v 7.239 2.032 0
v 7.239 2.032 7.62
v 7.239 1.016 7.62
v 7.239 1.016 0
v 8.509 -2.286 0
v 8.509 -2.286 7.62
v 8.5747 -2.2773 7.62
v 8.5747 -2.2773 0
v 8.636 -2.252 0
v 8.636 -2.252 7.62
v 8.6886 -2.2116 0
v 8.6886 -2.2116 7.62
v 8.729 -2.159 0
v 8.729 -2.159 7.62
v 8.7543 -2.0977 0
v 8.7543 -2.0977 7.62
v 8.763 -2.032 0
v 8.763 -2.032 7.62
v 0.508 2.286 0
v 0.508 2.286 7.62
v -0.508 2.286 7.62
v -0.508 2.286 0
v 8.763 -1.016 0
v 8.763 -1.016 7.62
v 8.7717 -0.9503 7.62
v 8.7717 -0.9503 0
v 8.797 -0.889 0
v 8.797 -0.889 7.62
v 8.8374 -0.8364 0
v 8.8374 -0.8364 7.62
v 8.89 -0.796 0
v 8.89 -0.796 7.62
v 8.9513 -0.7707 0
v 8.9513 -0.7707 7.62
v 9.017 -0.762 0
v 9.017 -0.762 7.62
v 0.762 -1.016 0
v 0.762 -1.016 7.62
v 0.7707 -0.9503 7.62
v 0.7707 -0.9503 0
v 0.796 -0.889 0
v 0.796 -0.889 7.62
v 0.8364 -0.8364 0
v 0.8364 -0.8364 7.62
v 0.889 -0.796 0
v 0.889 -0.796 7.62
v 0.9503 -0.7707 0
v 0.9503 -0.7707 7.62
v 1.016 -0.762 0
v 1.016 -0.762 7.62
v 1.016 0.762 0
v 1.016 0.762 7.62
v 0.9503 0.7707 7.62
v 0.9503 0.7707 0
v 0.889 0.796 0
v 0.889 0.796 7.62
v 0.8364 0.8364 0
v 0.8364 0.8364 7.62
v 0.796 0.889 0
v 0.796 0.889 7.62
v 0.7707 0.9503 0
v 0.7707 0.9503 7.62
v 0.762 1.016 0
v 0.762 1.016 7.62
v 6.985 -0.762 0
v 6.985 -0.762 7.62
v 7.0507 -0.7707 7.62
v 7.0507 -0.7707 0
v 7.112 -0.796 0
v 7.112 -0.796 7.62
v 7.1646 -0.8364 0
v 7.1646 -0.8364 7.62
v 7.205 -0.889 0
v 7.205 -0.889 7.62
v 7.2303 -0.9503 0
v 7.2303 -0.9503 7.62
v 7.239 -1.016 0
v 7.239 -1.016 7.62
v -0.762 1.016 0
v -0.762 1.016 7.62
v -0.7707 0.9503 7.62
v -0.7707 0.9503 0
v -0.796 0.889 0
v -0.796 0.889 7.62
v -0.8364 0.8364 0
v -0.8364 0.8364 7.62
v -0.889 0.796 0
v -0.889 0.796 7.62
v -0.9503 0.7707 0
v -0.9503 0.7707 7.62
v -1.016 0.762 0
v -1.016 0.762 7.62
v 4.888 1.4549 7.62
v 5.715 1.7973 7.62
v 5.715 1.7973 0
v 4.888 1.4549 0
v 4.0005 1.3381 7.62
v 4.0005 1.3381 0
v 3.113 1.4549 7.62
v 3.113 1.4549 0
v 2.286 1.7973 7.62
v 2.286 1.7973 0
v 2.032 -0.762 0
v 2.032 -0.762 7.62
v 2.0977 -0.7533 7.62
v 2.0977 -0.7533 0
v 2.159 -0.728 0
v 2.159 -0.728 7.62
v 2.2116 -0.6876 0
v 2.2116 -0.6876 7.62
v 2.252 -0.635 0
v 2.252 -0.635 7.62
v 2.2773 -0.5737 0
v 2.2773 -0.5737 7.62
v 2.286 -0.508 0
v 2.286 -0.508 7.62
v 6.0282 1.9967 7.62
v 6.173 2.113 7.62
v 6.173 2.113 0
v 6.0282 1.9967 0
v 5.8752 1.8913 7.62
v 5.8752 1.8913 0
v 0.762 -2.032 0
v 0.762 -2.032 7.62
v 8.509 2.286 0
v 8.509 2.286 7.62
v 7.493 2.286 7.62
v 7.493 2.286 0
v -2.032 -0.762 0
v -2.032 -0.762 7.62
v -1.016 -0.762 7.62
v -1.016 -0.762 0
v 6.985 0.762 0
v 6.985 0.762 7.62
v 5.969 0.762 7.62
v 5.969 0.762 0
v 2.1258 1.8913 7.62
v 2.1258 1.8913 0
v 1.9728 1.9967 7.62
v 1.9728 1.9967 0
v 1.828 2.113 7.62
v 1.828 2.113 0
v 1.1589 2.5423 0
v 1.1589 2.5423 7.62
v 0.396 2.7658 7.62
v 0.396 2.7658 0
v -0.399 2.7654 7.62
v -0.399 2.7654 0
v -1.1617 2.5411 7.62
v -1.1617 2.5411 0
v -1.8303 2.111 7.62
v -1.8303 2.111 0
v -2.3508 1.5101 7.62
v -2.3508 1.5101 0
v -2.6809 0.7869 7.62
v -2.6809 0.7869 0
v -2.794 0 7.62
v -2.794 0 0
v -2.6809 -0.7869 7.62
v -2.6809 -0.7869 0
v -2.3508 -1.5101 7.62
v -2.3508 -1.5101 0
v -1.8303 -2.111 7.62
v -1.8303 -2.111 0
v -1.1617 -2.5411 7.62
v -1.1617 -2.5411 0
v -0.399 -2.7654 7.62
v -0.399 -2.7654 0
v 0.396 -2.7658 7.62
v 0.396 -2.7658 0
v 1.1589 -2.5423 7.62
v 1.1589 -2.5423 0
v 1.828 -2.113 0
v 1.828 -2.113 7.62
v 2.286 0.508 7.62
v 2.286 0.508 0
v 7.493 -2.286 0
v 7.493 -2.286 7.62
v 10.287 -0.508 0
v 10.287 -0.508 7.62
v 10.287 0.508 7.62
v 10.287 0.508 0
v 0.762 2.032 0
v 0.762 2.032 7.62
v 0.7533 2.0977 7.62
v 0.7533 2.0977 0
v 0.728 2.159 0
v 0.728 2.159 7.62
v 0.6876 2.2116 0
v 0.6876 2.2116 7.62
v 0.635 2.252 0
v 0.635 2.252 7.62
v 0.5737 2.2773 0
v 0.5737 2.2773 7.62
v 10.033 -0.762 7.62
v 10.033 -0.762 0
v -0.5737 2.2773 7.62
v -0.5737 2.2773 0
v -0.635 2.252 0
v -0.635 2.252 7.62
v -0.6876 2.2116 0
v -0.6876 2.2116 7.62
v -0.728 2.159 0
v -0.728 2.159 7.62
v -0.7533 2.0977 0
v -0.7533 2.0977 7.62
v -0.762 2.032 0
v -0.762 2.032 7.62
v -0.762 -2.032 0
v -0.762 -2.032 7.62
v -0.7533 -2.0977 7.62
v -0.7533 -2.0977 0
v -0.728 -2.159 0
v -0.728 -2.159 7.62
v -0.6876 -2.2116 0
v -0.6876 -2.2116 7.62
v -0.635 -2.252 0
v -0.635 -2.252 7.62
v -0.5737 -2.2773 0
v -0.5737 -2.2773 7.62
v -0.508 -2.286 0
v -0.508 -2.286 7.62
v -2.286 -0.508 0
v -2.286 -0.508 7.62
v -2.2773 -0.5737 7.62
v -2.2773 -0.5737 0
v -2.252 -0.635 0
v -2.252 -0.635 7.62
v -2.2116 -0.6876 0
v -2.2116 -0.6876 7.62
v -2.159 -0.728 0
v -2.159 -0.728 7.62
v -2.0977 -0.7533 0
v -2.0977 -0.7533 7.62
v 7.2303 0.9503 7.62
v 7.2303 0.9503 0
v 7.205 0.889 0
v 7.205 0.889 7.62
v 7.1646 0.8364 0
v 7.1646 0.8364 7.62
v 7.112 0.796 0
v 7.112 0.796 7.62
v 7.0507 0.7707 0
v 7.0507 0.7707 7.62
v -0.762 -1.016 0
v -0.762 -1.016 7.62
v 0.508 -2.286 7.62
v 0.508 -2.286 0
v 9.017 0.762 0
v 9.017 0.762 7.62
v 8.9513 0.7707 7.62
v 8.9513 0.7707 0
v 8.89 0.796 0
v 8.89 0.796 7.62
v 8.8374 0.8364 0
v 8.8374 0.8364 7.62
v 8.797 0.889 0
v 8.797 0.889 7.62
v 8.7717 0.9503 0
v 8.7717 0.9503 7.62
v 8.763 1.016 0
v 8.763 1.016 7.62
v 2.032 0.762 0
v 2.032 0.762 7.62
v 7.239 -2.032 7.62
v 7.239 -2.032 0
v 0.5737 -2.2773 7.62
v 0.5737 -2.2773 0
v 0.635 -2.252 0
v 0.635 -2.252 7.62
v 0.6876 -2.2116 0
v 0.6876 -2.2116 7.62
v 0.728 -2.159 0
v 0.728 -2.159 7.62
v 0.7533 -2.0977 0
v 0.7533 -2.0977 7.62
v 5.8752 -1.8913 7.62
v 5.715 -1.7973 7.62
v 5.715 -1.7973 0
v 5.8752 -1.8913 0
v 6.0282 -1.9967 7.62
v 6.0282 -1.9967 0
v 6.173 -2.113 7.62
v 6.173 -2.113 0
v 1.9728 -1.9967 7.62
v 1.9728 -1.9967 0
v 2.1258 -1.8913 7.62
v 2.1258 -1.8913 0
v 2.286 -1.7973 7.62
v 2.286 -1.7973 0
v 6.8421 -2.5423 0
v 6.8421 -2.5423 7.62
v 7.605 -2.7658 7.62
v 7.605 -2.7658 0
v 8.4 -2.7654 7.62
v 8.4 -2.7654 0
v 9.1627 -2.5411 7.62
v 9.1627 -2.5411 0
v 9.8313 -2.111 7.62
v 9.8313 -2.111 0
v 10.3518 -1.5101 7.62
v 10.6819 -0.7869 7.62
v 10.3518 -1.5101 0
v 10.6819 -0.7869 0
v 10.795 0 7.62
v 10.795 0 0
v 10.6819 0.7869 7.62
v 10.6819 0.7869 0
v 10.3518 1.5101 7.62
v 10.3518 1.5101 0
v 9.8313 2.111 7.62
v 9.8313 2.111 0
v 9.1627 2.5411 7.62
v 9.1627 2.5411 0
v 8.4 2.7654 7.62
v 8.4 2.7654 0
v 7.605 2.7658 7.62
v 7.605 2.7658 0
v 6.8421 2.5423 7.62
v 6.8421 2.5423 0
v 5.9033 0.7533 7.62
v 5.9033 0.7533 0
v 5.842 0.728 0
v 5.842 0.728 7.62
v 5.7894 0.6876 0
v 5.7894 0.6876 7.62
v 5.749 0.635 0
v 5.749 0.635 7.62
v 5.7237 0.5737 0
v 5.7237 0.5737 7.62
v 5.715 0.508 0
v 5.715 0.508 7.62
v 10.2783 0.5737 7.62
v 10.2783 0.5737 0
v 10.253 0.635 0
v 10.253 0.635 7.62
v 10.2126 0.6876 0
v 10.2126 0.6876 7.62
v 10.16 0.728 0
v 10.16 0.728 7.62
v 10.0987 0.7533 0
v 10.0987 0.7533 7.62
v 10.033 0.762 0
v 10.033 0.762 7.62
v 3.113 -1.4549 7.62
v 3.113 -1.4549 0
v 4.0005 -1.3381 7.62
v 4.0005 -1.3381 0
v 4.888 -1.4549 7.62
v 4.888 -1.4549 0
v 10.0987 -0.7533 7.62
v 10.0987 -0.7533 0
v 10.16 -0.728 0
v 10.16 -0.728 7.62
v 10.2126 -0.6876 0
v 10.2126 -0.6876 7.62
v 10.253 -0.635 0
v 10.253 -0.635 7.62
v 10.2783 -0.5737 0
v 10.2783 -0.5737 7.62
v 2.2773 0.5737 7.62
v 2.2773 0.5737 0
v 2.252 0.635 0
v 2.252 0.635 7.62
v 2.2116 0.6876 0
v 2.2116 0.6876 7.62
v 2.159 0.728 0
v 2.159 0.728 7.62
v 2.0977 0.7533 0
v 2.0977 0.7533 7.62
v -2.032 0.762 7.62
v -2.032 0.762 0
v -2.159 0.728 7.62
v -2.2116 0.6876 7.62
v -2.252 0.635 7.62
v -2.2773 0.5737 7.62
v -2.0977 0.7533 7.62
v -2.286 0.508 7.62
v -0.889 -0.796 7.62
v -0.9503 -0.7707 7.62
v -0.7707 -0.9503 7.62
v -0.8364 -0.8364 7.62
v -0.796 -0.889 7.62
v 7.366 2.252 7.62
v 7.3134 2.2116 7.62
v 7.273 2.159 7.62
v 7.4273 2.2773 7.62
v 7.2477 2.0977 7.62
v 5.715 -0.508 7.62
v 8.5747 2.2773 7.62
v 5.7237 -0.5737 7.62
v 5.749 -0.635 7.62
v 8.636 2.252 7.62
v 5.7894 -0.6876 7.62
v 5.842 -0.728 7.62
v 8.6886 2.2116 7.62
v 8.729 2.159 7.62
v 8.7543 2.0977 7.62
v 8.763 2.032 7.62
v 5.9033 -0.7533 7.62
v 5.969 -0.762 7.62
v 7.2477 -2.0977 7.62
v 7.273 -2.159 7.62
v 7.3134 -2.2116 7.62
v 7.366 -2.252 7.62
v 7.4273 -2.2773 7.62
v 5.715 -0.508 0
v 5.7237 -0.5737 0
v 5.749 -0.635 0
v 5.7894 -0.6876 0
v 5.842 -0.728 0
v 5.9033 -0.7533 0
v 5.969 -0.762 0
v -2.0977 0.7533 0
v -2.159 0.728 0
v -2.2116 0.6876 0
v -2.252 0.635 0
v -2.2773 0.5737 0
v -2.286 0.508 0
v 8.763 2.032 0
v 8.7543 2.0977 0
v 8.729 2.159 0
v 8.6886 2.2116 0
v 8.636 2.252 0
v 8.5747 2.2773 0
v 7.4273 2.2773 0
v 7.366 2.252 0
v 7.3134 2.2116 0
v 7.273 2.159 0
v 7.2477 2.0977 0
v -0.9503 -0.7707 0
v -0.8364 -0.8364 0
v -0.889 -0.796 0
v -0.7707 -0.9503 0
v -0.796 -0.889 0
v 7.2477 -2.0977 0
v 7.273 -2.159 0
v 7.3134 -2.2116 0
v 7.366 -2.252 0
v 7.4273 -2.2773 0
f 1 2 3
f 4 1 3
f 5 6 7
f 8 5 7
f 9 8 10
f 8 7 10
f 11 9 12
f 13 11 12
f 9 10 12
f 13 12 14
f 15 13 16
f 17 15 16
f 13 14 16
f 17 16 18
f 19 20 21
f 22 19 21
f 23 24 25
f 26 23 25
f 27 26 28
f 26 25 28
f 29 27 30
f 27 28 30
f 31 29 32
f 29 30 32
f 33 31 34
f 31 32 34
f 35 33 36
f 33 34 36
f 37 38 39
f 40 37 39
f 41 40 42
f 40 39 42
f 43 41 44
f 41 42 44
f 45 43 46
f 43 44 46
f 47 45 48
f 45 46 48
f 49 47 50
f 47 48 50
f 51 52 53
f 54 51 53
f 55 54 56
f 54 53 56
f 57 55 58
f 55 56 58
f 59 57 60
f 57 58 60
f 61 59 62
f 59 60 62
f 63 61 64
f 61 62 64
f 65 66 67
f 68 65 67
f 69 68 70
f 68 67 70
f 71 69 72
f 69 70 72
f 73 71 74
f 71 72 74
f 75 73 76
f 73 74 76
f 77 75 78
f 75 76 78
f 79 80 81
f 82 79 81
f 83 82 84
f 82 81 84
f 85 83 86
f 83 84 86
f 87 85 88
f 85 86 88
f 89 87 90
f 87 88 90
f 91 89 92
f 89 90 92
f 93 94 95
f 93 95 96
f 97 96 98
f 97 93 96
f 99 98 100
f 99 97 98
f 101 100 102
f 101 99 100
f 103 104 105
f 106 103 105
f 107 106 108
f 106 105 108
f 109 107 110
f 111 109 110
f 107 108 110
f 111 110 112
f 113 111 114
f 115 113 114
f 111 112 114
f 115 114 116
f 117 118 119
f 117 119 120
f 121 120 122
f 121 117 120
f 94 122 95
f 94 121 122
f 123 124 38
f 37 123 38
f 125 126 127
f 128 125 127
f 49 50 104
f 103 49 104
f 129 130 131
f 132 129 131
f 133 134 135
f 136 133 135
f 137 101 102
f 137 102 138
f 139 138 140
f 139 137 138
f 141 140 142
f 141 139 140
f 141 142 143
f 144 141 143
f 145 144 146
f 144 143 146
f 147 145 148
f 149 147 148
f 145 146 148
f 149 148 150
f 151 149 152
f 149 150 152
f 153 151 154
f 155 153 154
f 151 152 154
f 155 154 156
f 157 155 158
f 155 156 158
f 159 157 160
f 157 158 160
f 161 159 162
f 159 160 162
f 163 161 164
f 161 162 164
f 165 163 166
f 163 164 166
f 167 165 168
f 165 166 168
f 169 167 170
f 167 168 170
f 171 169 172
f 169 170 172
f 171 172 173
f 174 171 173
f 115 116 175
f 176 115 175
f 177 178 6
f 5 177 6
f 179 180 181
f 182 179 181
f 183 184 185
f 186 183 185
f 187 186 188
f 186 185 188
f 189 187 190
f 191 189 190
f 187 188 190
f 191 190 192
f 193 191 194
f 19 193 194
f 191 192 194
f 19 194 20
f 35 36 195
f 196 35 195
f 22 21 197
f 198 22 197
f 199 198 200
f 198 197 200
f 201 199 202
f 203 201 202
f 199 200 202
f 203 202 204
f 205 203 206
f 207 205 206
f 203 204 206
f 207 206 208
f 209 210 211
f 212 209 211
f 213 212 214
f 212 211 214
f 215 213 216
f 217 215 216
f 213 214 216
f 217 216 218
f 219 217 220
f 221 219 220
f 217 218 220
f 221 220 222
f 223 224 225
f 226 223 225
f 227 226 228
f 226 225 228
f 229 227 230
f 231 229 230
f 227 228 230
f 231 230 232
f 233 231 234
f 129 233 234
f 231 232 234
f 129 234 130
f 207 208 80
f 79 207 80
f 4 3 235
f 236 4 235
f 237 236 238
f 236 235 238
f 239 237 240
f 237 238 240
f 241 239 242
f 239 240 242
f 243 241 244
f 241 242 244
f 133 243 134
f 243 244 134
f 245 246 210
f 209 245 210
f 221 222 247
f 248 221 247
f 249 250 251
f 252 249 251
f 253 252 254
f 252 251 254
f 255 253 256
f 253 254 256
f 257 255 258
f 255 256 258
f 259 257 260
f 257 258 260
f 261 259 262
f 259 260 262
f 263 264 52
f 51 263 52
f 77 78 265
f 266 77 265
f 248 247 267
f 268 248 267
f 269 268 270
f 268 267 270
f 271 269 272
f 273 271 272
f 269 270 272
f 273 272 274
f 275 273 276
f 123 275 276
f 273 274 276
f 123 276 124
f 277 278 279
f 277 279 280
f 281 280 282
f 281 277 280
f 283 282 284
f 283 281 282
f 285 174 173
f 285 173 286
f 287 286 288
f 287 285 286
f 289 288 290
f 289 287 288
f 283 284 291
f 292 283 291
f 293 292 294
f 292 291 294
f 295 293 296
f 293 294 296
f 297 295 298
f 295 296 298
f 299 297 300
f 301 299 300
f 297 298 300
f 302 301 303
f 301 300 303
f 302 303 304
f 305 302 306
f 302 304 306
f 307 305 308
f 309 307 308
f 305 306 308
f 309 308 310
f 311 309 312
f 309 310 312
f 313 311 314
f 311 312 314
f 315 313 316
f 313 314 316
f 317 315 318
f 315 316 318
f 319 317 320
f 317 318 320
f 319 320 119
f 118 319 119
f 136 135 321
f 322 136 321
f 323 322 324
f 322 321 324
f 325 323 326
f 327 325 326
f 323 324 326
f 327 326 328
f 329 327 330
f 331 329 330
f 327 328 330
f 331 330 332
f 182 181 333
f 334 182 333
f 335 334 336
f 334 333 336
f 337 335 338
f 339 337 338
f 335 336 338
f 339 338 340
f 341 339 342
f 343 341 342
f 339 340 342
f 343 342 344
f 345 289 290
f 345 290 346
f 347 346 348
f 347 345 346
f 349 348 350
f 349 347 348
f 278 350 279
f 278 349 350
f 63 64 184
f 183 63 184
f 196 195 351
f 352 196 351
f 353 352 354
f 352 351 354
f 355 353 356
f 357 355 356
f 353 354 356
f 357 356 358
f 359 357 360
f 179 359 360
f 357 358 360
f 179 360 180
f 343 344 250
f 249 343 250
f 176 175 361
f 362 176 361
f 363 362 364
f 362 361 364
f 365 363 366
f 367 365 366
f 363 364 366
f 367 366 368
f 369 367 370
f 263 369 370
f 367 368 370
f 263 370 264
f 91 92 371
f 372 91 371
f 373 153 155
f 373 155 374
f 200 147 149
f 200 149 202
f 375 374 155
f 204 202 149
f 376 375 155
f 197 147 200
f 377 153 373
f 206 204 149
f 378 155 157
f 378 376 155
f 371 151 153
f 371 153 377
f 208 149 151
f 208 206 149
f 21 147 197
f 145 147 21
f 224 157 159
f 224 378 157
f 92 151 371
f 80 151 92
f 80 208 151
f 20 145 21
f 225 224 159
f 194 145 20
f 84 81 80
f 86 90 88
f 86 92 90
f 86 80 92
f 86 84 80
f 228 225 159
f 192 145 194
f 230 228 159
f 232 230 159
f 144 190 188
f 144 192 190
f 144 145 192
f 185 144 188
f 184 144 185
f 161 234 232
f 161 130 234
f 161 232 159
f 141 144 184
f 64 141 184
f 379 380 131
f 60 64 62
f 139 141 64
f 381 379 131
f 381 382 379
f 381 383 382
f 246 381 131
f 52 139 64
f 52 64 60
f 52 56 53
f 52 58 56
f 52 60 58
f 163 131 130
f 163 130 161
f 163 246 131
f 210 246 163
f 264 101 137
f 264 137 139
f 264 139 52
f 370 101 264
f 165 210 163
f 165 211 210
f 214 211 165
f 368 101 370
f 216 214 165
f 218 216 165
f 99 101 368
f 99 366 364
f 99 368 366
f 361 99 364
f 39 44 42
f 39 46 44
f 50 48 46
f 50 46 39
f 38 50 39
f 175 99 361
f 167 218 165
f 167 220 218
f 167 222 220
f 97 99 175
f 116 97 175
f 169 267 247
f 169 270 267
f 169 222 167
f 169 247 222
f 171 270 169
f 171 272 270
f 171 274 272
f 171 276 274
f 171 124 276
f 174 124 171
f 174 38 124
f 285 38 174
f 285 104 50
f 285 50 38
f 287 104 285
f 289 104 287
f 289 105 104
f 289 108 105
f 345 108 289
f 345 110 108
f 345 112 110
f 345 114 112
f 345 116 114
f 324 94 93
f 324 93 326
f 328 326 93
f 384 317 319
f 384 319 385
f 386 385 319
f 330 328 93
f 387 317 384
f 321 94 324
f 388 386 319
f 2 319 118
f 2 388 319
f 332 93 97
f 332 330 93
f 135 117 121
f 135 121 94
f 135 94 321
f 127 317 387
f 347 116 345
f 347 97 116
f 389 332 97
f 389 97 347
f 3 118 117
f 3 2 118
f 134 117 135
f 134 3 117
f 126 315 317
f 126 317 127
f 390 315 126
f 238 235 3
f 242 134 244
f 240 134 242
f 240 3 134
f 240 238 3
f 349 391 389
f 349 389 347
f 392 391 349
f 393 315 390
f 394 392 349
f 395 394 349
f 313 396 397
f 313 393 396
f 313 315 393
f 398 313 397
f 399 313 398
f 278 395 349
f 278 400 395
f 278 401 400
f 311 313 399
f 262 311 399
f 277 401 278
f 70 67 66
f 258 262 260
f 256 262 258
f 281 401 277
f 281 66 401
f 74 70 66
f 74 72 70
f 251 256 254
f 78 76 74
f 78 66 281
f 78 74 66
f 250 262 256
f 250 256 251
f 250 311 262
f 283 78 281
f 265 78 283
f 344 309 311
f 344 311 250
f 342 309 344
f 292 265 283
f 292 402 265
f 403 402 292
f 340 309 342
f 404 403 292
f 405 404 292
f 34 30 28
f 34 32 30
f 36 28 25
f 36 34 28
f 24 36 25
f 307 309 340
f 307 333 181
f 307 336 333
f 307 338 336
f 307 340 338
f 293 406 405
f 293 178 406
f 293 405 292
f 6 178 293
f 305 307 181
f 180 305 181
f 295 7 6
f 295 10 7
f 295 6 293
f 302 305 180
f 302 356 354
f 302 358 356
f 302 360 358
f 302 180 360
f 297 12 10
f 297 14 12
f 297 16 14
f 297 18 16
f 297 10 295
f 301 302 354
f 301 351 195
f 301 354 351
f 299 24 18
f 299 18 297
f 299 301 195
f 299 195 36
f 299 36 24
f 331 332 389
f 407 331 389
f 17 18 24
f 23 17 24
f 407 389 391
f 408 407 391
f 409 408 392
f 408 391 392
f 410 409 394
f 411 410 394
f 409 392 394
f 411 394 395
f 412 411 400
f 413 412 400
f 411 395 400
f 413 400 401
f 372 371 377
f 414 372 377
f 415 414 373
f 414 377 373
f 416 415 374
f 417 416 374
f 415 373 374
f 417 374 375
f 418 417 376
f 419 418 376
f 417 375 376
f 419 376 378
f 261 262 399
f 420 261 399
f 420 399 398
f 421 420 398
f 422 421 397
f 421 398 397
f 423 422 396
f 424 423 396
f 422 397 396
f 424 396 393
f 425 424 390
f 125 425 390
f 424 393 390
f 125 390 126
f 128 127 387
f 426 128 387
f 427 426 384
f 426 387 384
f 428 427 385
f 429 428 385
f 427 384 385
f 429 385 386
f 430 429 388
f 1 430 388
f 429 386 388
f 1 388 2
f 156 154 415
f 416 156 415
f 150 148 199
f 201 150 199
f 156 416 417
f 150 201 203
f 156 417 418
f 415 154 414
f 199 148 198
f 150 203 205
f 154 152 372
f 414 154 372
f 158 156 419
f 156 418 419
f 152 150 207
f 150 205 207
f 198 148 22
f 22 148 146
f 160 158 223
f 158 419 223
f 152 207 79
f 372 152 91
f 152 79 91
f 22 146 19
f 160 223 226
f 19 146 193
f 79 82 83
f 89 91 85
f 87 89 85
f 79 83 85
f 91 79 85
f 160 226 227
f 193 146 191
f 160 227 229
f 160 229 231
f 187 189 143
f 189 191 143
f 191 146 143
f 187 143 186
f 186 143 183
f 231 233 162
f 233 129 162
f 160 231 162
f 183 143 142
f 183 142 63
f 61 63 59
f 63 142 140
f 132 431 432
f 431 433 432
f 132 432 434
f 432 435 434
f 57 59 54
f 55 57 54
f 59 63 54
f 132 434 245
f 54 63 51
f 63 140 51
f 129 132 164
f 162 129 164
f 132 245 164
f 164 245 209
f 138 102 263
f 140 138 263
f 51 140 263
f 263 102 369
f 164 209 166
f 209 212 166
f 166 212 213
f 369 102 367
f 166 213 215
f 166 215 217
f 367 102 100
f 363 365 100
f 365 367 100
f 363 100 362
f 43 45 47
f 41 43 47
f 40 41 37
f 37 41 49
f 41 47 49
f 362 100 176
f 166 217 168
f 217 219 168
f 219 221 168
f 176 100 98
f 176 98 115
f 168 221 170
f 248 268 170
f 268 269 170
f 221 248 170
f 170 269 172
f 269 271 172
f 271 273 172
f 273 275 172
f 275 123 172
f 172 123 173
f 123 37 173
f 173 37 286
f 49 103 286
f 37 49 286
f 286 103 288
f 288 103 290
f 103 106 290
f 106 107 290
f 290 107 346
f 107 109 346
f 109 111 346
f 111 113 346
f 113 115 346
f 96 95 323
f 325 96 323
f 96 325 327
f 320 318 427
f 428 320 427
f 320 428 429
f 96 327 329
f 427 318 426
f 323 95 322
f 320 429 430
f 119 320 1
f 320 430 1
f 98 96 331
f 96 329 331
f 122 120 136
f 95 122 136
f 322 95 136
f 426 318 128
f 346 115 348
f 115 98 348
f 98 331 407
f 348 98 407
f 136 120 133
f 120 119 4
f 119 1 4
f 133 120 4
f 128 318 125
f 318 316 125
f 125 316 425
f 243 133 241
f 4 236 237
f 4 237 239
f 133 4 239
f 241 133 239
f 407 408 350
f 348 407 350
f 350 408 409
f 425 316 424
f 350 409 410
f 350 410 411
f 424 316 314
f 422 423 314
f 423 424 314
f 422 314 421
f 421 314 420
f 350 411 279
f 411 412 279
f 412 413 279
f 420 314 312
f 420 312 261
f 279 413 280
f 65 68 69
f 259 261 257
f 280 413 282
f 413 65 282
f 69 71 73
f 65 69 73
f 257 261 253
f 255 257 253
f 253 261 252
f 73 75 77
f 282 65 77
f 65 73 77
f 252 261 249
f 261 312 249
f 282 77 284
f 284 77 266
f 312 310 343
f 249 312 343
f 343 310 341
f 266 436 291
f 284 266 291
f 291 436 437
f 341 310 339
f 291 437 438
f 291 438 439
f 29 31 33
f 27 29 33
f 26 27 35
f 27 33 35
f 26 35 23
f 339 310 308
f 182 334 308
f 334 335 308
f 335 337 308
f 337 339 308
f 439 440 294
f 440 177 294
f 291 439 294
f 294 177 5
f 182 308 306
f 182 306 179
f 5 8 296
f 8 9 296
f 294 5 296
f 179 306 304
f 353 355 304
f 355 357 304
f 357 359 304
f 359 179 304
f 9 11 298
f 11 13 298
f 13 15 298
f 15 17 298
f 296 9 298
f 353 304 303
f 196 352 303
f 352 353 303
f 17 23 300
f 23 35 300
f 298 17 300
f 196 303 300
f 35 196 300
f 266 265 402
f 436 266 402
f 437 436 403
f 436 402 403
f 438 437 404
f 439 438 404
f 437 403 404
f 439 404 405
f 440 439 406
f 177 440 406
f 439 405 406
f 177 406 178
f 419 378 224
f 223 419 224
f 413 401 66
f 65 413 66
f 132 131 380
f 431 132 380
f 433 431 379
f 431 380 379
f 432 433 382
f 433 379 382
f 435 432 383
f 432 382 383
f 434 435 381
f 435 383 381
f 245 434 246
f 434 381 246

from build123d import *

# Parameters (mm, degrees)
SKETCH2_R          = 2.794
EXTRUDE1_DEPTH     = 7.62
CUT_EXTRUDE1_DEPTH = 9.583546586
LPATTERN1_COUNT    = 2
LPATTERN1_PITCH    = 8.001
EXTRUDE3_DEPTH     = 7.62
FILLET1_R          = 2.54


with BuildPart() as part:
    # Sketch2 → Extrude1 (new body)
    with BuildSketch(Plane.XY):
        with Locations(Location((0, 0, 0), (0, 0, 180))):
            Circle(SKETCH2_R)
    extrude(amount=EXTRUDE1_DEPTH)

    # Sketch3 → Cut-Extrude1 (cut, through all)
    with BuildSketch(Plane.XY.offset(7.62)):
        with BuildLine():
            Line((-0.762, 2.032), (-0.762, 1.016))
            ThreePointArc((-0.762, 1.016), (-0.836394878, 0.836394878), (-1.016, 0.762))
            Line((-1.016, 0.762), (-2.032, 0.762))
            ThreePointArc((-2.032, 0.762), (-2.211605122, 0.687605122), (-2.286, 0.508))
            Line((-2.286, 0.508), (-2.286, -0.508))
            ThreePointArc((-2.286, -0.508), (-2.211605122, -0.687605122), (-2.032, -0.762))
            Line((-2.032, -0.762), (-1.016, -0.762))
            ThreePointArc((-1.016, -0.762), (-0.836394878, -0.836394878), (-0.762, -1.016))
            Line((-0.762, -1.016), (-0.762, -2.032))
            ThreePointArc((-0.762, -2.032), (-0.687605122, -2.211605122), (-0.508, -2.286))
            Line((-0.508, -2.286), (0.508, -2.286))
            ThreePointArc((0.508, -2.286), (0.687605122, -2.211605122), (0.762, -2.032))
            Line((0.762, -2.032), (0.762, -1.016))
            ThreePointArc((0.762, -1.016), (0.836394878, -0.836394878), (1.016, -0.762))
            Line((1.016, -0.762), (2.032, -0.762))
            ThreePointArc((2.032, -0.762), (2.211605122, -0.687605122), (2.286, -0.508))
            Line((2.286, -0.508), (2.286, 0.508))
            ThreePointArc((2.286, 0.508), (2.211605122, 0.687605122), (2.032, 0.762))
            Line((2.032, 0.762), (1.016, 0.762))
            ThreePointArc((1.016, 0.762), (0.836394878, 0.836394878), (0.762, 1.016))
            Line((0.762, 1.016), (0.762, 2.032))
            ThreePointArc((0.762, 2.032), (0.687605122, 2.211605122), (0.508, 2.286))
            Line((0.508, 2.286), (-0.508, 2.286))
            ThreePointArc((-0.508, 2.286), (-0.687605122, 2.211605122), (-0.762, 2.032))
        make_face()
    extrude(amount=-CUT_EXTRUDE1_DEPTH, mode=Mode.SUBTRACT)


with BuildPart() as lpattern1_1:
    # LPattern1: pattern copy
    add(part.part.moved(Location(Vector(1, 0, 0) * (1 * LPATTERN1_PITCH))))


with BuildPart() as part_1:
    add(part.part)

    add(lpattern1_1.part)  # Extrude3 merges LPattern1_1
    # Sketch5 → Extrude3 (add, through all)
    with BuildSketch(Plane.XY.offset(7.62)):
        with BuildLine():
            Line((2.286, 1.797323066), (2.286, -1.797323066))
            ThreePointArc((2.286, -1.797323066), (4.0005, -1.338121812), (5.715, -1.797323066))
            Line((5.715, -1.797323066), (5.715, 1.797323066))
            ThreePointArc((5.715, 1.797323066), (4.0005, 1.338121812), (2.286, 1.797323066))
        make_face()
    extrude(amount=-EXTRUDE3_DEPTH)

    # Fillet1
    # the kernel refuses this fillet: 2.54 mm, written as the material it adds along each edge
    with BuildSketch(Plane(origin=(2.286, 1.606437051, 7.62), x_dir=(-0.6706382745586644, 0.7417845406160589, 0), z_dir=(0, 0, -1))) as fillet1_piece_1:
        with BuildLine():
            CenterArc((0.993305965, 2.520961484), FILLET1_R, 250.408076785, 12.572378174)
            Line((0.141596295, 0.128015467), (0, 0))
            ThreePointArc((0, 0), (0.341448925, 0.020942368), (0.682897851, 0))
        make_face()
    extrude(amount=7.62)
    with BuildSketch(Plane(origin=(2.286, -1.606437051, 7.62), x_dir=(-0.6706382745586632, -0.7417845406160598, 0), z_dir=(0, 0, -1))) as fillet1_piece_2:
        with BuildLine():
            CenterArc((0.993305965, -2.520961484), FILLET1_R, 97.019545041, 12.572378174)
            Line((0.141596295, -0.128015467), (0, 0))
            ThreePointArc((0, 0), (0.341448925, -0.020942368), (0.682897851, 0))
        make_face()
    extrude(amount=7.62)
    with BuildSketch(Plane(origin=(5.715, -1.606437051, 7.62), x_dir=(0, -1, 0), z_dir=(0, 0, -1))) as fillet1_piece_3:
        with BuildLine():
            CenterArc((2.427472269, 1.203861258), FILLET1_R, 208.291730517, 12.572378174)
            ThreePointArc((0.506563069, -0.457977436), (0.267326288, -0.213453994), (0, 0))
            Line((0, 0), (0.190886015, 0))
        make_face()
    extrude(amount=7.62)
    with BuildSketch(Plane(origin=(5.715, 1.606437051, 7.62), x_dir=(0, 1, 0), z_dir=(0, 0, -1))) as fillet1_piece_4:
        with BuildLine():
            CenterArc((2.427472269, -1.203861258), FILLET1_R, 139.135891309, 12.572378174)
            ThreePointArc((0.506563069, 0.457977436), (0.267326288, 0.213453994), (0, 0))
            Line((0, 0), (0.190886015, 0))
        make_face()
    extrude(amount=7.62)


solid = part_1.part
